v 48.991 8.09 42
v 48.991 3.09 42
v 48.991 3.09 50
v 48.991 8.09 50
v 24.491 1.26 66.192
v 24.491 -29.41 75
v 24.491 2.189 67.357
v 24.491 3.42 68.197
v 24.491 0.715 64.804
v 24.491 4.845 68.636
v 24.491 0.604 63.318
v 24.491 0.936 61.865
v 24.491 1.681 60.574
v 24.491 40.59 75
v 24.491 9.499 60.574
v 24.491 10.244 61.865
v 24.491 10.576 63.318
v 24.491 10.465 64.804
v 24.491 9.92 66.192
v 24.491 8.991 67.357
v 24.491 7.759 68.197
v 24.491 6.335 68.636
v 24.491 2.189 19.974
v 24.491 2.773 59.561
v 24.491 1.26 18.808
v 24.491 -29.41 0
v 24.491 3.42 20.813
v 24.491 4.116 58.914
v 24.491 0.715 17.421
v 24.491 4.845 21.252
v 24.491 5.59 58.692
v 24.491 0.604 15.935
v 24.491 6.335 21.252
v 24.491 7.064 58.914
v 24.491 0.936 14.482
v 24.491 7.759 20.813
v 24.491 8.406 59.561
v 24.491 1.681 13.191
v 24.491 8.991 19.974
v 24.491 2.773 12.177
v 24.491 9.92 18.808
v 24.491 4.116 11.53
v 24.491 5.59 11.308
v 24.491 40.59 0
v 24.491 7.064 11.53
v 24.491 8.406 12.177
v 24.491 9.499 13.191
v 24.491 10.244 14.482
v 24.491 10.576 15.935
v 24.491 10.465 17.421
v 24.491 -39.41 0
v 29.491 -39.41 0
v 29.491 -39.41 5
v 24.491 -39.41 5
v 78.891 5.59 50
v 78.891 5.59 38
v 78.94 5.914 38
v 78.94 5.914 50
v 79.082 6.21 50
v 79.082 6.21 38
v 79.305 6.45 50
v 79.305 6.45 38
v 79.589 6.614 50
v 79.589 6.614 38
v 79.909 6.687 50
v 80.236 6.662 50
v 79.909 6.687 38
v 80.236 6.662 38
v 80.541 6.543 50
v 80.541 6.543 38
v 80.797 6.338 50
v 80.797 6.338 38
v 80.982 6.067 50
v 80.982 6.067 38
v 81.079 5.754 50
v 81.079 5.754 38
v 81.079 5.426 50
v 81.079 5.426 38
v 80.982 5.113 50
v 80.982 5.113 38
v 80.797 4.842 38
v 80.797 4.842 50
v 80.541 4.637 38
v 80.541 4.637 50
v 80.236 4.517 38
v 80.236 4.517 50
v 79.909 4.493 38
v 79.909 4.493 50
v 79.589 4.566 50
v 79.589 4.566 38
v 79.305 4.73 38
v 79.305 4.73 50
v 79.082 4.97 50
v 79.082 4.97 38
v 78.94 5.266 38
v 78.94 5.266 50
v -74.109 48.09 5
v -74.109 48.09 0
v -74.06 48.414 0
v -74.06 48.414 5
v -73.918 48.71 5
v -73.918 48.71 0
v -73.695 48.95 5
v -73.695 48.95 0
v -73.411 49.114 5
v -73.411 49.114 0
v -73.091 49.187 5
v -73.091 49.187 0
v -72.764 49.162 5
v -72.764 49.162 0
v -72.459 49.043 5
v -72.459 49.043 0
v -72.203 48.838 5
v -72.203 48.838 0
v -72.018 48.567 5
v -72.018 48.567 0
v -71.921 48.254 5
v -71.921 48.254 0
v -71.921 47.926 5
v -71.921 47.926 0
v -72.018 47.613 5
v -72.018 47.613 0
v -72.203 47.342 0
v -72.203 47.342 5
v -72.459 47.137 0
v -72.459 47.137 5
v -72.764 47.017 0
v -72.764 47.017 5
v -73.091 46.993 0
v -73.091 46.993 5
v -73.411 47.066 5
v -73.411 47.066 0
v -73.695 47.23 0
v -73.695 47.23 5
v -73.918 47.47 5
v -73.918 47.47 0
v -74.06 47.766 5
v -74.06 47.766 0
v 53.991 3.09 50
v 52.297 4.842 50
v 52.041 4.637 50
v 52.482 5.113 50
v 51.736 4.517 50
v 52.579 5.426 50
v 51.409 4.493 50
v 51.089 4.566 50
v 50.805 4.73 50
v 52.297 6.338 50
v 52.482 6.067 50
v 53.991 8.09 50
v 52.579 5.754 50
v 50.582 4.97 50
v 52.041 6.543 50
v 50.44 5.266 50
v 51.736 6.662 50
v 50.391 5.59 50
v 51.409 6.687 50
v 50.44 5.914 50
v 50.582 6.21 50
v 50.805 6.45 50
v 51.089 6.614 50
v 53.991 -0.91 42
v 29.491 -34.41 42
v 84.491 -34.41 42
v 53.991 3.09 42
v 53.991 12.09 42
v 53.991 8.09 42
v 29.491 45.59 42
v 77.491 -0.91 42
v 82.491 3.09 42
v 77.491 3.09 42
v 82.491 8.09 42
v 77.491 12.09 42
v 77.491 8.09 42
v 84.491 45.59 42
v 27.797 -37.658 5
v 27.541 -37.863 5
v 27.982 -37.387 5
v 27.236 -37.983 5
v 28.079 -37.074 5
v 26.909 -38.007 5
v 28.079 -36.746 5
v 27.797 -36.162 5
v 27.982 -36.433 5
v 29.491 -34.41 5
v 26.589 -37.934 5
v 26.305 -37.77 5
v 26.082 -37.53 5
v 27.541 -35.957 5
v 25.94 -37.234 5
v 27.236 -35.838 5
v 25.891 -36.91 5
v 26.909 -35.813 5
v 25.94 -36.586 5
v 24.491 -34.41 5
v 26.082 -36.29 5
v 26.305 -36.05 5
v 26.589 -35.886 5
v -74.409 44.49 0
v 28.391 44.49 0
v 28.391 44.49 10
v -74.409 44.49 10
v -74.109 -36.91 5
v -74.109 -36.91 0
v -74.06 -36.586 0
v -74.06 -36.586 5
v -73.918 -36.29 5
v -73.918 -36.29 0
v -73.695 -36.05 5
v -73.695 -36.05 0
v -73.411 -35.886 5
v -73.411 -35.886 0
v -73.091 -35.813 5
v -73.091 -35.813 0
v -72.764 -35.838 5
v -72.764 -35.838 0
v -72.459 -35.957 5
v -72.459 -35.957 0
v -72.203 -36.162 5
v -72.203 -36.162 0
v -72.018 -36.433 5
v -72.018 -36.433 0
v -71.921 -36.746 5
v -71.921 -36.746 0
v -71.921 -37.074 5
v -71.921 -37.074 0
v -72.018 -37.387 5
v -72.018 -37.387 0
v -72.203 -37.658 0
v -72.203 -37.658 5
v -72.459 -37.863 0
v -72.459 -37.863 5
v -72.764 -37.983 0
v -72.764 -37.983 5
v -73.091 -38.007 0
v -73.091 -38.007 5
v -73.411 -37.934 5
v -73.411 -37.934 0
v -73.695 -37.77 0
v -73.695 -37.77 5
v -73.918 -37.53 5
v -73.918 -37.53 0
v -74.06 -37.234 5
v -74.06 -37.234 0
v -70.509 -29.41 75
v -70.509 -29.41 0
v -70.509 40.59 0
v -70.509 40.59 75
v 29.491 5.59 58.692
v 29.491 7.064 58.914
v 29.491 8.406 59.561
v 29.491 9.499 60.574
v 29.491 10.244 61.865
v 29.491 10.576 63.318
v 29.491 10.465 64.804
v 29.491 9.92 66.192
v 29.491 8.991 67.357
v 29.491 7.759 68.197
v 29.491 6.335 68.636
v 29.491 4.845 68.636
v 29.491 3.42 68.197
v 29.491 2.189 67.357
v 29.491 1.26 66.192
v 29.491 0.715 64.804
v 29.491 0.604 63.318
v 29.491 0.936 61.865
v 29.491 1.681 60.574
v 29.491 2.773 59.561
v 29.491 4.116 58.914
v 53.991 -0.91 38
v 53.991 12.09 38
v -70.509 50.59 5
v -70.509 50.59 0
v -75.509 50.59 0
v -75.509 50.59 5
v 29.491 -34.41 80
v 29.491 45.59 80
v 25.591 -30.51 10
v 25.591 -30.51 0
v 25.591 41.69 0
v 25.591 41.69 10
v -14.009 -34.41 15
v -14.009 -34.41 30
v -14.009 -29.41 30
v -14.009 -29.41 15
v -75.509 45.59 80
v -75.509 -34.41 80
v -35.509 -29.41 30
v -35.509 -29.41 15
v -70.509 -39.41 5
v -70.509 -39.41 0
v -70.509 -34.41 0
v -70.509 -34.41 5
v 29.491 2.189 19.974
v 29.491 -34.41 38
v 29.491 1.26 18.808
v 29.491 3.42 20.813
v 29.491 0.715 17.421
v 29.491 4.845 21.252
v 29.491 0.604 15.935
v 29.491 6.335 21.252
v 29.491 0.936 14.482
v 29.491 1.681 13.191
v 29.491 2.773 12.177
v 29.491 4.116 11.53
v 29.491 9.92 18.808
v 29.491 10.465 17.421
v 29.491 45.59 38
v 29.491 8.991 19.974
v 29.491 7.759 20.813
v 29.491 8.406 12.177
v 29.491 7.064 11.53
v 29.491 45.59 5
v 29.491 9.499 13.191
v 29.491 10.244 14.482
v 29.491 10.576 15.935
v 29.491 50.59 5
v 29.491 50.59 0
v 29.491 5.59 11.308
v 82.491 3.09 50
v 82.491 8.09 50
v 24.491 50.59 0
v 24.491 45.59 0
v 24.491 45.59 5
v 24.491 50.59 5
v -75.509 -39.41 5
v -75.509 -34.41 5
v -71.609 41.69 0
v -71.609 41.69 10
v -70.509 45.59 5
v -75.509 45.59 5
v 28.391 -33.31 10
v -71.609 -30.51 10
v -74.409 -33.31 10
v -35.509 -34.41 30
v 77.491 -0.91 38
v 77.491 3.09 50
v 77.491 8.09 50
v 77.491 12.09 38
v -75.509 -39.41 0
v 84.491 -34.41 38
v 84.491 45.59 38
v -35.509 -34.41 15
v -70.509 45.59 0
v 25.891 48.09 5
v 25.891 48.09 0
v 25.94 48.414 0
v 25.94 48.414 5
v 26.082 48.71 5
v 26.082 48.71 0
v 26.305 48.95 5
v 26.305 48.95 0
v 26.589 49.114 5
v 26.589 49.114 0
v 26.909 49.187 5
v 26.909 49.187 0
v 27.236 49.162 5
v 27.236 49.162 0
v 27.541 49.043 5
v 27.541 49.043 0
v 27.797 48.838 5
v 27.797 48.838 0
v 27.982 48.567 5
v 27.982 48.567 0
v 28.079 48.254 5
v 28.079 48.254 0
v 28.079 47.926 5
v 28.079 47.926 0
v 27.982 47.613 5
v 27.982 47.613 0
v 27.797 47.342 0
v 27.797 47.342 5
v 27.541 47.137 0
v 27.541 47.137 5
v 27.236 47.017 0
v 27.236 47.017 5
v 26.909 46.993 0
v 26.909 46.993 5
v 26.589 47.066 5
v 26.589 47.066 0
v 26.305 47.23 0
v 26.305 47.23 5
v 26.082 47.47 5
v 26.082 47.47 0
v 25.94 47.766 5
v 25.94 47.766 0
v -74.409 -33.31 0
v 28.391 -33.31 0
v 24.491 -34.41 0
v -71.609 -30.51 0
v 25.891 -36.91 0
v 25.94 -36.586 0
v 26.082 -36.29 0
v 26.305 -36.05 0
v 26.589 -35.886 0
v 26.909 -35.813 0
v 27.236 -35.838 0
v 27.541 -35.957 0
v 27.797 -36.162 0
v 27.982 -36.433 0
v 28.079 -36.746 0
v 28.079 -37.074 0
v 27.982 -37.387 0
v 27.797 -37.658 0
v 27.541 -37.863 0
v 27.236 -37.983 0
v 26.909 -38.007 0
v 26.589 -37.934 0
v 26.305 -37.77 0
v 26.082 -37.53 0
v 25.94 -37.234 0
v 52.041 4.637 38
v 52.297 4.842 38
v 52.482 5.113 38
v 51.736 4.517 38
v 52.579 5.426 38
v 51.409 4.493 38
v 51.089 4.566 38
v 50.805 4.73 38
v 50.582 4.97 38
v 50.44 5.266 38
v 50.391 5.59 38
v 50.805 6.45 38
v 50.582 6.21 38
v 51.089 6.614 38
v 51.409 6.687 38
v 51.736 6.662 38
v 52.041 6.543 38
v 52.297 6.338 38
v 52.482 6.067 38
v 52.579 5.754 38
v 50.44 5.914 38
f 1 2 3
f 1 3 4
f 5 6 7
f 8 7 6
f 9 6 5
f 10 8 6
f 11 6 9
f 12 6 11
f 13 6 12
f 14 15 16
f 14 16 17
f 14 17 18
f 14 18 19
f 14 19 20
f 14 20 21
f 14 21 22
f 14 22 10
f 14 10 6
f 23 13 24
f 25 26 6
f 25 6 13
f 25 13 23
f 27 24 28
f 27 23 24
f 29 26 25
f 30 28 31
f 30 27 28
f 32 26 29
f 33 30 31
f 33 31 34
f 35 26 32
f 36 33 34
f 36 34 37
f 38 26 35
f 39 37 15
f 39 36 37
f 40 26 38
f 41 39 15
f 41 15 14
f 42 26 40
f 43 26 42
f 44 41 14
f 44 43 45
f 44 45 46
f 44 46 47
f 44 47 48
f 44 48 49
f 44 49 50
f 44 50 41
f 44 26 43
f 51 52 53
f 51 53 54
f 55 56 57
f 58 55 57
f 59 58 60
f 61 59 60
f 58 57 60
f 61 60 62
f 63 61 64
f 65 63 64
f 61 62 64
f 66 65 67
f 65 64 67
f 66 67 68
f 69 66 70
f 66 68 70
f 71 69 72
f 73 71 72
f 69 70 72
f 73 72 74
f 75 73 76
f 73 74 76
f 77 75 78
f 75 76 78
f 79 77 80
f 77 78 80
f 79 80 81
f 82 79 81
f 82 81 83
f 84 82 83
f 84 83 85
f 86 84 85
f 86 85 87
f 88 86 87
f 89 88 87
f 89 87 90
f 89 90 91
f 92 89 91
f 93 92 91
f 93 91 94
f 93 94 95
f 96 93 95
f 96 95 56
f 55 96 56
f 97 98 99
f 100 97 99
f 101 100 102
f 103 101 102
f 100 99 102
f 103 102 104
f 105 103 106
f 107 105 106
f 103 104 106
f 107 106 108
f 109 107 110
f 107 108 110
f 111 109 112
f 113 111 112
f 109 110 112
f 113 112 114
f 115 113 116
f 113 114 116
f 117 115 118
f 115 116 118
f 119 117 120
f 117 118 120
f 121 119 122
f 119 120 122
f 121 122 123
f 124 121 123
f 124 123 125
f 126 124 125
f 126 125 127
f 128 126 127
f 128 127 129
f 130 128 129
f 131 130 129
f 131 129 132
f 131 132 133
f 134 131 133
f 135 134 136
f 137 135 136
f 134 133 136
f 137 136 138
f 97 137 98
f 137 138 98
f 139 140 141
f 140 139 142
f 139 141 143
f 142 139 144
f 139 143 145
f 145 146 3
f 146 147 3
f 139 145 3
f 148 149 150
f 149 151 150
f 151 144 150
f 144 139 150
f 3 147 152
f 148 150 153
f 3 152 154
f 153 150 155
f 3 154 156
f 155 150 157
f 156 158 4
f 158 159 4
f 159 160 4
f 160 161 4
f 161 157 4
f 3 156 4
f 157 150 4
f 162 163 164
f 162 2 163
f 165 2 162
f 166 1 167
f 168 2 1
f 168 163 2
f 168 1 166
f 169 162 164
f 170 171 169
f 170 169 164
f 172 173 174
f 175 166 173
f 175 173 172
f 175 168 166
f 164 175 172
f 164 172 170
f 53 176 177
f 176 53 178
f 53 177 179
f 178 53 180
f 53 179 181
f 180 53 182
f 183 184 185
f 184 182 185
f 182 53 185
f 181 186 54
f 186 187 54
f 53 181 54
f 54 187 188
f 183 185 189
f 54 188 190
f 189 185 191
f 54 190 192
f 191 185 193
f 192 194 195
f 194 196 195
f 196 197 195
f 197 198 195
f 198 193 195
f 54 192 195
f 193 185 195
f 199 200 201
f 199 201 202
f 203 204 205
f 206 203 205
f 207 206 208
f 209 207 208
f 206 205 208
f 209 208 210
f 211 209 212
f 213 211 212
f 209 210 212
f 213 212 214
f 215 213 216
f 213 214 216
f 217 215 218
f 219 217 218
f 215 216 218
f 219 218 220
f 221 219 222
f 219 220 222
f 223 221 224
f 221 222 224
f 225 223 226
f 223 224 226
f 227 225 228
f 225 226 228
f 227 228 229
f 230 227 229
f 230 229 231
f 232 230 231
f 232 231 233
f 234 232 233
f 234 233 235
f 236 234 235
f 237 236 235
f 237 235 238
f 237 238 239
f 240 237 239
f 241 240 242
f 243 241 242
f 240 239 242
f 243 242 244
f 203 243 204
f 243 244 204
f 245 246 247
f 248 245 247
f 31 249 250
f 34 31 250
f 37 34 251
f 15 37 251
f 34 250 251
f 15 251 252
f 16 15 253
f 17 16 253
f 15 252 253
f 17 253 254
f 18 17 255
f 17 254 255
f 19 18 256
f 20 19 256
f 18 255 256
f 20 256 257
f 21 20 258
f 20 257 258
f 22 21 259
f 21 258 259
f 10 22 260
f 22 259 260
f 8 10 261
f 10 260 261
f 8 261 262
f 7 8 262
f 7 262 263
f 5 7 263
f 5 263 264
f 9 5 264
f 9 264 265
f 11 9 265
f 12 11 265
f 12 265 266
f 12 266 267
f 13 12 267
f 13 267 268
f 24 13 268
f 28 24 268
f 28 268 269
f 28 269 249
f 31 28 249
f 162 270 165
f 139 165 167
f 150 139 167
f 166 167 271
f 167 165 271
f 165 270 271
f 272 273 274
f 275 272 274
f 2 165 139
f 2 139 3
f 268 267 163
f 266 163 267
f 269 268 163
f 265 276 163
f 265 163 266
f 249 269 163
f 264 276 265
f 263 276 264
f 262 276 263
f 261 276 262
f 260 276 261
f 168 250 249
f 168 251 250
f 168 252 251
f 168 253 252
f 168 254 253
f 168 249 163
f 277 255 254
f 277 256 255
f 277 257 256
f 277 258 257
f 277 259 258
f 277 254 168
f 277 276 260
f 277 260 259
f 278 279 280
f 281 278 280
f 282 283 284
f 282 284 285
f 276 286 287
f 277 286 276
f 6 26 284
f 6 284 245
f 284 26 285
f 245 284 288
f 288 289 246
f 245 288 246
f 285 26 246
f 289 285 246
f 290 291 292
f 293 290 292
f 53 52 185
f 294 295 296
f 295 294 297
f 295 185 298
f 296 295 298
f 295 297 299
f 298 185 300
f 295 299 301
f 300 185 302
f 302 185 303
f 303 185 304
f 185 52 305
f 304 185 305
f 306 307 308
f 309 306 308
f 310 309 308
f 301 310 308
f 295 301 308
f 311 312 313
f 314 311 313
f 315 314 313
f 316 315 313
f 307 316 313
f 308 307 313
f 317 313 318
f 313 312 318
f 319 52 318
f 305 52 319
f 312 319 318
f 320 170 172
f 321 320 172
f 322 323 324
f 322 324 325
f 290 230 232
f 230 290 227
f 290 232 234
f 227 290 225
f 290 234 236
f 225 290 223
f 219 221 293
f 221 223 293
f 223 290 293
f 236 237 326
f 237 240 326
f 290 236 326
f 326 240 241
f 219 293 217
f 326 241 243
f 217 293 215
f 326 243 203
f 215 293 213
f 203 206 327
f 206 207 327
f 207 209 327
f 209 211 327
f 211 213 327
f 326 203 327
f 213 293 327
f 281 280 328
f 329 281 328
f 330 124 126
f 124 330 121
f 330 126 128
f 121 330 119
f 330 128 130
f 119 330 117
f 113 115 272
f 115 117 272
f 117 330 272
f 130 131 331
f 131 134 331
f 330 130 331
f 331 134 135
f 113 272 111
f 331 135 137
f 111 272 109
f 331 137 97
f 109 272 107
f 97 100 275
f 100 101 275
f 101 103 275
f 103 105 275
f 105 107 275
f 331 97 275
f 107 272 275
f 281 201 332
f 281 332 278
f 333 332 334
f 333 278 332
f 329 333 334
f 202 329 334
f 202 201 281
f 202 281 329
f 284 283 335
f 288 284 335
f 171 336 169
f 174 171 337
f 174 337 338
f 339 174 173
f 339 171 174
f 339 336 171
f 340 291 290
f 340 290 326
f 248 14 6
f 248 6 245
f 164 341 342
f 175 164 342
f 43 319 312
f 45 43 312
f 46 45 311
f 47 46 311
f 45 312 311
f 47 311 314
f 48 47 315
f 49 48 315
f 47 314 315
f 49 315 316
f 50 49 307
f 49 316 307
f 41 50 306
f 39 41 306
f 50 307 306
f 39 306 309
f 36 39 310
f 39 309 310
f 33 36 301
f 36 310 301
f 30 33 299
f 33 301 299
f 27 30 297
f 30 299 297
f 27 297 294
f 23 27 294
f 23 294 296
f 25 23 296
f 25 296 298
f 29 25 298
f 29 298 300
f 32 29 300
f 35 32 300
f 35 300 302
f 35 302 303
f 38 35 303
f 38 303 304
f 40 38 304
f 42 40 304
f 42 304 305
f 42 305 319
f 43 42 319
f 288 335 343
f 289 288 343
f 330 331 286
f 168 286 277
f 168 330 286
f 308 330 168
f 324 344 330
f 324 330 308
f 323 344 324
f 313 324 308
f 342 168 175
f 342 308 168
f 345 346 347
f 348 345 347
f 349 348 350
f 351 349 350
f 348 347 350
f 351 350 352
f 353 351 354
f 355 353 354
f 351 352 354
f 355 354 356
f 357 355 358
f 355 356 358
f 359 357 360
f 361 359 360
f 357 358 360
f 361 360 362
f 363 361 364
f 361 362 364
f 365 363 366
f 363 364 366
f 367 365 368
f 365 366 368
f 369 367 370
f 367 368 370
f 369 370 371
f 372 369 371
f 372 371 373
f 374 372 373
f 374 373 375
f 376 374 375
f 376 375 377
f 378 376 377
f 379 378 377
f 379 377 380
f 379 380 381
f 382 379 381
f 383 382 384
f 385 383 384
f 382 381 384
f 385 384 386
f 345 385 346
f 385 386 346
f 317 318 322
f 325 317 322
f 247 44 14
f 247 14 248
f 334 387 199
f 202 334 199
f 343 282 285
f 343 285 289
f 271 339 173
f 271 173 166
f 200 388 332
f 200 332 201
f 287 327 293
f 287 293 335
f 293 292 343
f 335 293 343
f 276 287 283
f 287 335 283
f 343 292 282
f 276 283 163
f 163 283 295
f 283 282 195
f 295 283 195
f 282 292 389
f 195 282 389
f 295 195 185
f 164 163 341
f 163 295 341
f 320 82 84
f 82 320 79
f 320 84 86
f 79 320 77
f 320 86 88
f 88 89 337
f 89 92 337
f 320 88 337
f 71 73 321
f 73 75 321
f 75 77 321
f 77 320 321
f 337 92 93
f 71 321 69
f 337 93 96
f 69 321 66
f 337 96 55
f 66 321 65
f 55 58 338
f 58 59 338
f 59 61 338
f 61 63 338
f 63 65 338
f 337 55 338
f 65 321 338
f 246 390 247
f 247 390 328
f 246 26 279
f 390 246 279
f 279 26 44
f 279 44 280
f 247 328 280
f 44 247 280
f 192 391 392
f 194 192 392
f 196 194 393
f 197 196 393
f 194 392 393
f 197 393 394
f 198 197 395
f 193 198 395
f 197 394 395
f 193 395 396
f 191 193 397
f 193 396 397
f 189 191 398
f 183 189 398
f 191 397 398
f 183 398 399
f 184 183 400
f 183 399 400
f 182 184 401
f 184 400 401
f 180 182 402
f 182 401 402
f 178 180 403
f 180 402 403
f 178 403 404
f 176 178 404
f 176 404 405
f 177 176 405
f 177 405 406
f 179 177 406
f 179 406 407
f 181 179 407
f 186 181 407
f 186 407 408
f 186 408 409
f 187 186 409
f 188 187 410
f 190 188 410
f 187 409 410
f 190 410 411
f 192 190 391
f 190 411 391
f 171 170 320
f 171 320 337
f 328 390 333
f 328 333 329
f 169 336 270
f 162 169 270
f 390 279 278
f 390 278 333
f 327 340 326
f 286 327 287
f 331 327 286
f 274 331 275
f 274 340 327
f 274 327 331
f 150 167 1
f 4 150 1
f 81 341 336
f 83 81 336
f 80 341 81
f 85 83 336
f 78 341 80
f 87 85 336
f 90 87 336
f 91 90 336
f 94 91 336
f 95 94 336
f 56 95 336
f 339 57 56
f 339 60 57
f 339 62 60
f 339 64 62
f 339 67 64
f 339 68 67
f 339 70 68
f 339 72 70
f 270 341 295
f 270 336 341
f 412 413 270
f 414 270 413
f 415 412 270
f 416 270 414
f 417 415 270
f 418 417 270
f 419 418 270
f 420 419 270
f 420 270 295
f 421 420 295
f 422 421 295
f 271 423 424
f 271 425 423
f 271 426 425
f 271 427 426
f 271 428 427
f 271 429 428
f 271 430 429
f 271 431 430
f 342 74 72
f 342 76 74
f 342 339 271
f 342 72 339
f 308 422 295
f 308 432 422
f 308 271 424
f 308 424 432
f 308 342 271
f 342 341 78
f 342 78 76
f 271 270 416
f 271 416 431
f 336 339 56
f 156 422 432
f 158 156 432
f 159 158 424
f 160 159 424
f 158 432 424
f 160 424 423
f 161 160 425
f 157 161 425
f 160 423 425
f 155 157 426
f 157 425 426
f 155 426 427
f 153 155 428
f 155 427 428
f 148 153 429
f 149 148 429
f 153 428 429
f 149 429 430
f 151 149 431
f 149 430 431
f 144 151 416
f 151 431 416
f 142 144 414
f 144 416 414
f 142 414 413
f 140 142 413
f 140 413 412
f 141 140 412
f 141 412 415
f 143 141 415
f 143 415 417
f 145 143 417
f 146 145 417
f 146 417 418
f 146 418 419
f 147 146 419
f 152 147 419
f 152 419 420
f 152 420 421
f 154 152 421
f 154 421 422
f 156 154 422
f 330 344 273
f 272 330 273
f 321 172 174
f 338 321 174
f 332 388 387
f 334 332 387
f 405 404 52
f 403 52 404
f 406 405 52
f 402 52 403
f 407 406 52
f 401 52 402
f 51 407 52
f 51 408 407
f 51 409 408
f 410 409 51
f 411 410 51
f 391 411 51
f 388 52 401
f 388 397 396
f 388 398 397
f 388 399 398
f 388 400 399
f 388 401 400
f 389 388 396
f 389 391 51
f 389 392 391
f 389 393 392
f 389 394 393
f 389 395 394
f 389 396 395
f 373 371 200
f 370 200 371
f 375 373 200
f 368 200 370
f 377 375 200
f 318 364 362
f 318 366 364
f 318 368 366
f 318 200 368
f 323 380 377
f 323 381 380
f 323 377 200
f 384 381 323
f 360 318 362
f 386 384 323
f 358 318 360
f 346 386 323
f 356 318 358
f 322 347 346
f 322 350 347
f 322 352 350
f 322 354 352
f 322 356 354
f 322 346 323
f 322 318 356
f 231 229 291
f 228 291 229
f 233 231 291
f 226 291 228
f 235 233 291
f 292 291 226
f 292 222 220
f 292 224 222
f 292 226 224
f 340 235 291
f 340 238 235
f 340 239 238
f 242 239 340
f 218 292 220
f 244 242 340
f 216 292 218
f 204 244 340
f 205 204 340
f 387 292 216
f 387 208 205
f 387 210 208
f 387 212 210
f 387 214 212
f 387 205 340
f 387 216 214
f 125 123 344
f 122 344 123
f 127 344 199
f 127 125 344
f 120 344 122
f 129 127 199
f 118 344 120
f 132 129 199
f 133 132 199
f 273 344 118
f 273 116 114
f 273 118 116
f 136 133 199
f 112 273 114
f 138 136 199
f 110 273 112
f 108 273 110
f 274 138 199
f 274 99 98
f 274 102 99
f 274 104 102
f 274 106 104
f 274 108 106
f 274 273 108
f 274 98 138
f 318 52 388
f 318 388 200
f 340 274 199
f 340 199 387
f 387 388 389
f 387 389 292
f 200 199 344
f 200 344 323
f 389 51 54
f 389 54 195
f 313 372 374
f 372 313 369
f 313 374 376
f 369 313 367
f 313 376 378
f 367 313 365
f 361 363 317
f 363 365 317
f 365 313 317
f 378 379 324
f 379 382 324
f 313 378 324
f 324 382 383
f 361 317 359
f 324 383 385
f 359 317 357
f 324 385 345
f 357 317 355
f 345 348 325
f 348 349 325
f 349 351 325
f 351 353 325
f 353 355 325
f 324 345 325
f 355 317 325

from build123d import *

# Parameters (mm, degrees)
SKETCH_1_W                = 160
SKETCH_1_H                = 80
EXTRUDE_1_DEPTH           = 80
SKETCH_10_W               = 21.5
SKETCH_10_H               = 15
CUT_EXTRUDE_6_DEPTH       = 10
SKETCH_11_W               = 55
SKETCH_11_H               = 80
CUT_EXTRUDE_7_DEPTH       = 38
SKETCH_12_W               = 55
SKETCH_12_H               = 80
CUT_EXTRUDE_8_DEPTH       = 38
SKETCH_14_W               = 95
SKETCH_14_H               = 70
CUT_EXTRUDE_9_DEPTH       = 75
SKETCH_15_W               = 102.8
SKETCH_15_H               = 77.8
SKETCH_15_W_2             = 97.2
SKETCH_15_H_2             = 72.2
CUT_EXTRUDE_10_DEPTH      = 10
SKETCH_16_W               = 5
SKETCH_16_H               = 5
SKETCH_16_R               = 1.1
EXTRUDE_2_DEPTH           = 5
SKETCH_17_R               = 5
CUT_EXTRUDE_12_DEPTH      = 9.2
SKETCH_18_W               = 23.5
SKETCH_18_H               = 13
CUT_EXTRUDE_13_DEPTH      = 9.2
SKETCH_19_W               = 5
SKETCH_19_H               = 5
SKETCH_19_R               = 1.1
EXTRUDE_3_DEPTH           = 12
SKETCH_20_R               = 1.1
CUT_EXTRUDE_14_DEPTH      = 5
CUT_EXTRUDE_14_DEPTH_BACK = 5


with BuildPart() as part:
    # 草圖1 → 填料-伸長1 (new body)
    with BuildSketch(Plane.XY):
        with Locations((4.491097826, 5.58988764)):
            Rectangle(SKETCH_1_W, SKETCH_1_H)
    extrude(amount=EXTRUDE_1_DEPTH)

    # 草圖10 → 除料-伸長6 (cut)
    with BuildSketch(Plane(origin=(0, -34.41011236, 0), x_dir=(-1, 0, 0), z_dir=(0, -1, 0))):
        with Locations((24.758902174, -22.5)):
            Rectangle(SKETCH_10_W, SKETCH_10_H)
    extrude(amount=-CUT_EXTRUDE_6_DEPTH, mode=Mode.SUBTRACT)

    # 草圖11 → 除料-伸長7 (cut)
    with BuildSketch(Plane(origin=(0, 0, 0), x_dir=(-1, 0, 0), z_dir=(0, 0, -1))):
        with Locations((-56.991097826, 5.58988764)):
            Rectangle(SKETCH_11_W, SKETCH_11_H)
    extrude(amount=-CUT_EXTRUDE_7_DEPTH, mode=Mode.SUBTRACT)

    # 草圖12 → 除料-伸長8 (cut)
    with BuildSketch(Plane.XY.offset(80)):
        with Locations((56.991097826, 5.58988764)):
            Rectangle(SKETCH_12_W, SKETCH_12_H)
    extrude(amount=-CUT_EXTRUDE_8_DEPTH, mode=Mode.SUBTRACT)

    # 草圖14 → 除料-伸長9 (cut)
    with BuildSketch(Plane(origin=(0, 0, 0), x_dir=(-1, 0, 0), z_dir=(0, 0, -1))):
        with Locations((23.008902174, 5.58988764)):
            Rectangle(SKETCH_14_W, SKETCH_14_H)
    extrude(amount=-CUT_EXTRUDE_9_DEPTH, mode=Mode.SUBTRACT)

    # 草圖15 → 除料-伸長10 (cut)
    with BuildSketch(Plane(origin=(0, 0, 0), x_dir=(-1, 0, 0), z_dir=(0, 0, -1))):
        with Locations((23.008902174, 5.58988764)):
            Rectangle(SKETCH_15_W, SKETCH_15_H)
        with Locations((23.008902174, 5.58988764)):
            Rectangle(SKETCH_15_W_2, SKETCH_15_H_2, mode=Mode.SUBTRACT)
    extrude(amount=-CUT_EXTRUDE_10_DEPTH, mode=Mode.SUBTRACT)

    # 草圖16 → 填料-伸長2 (add)
    with BuildSketch(Plane(origin=(0, 0, 0), x_dir=(-1, 0, 0), z_dir=(0, 0, -1))):
        with Locations((-26.991097826, 48.08988764)):
            Rectangle(SKETCH_16_W, SKETCH_16_H)
        with Locations((-26.991097826, 48.08988764)):
            Circle(SKETCH_16_R, mode=Mode.SUBTRACT)
        with Locations((73.008902174, 48.08988764)):
            Rectangle(SKETCH_16_W, SKETCH_16_H)
        with Locations((73.008902174, 48.08988764)):
            Circle(SKETCH_16_R, mode=Mode.SUBTRACT)
        with Locations((73.008902174, -36.91011236)):
            Rectangle(SKETCH_16_W, SKETCH_16_H)
        with Locations((73.008902174, -36.91011236)):
            Circle(SKETCH_16_R, mode=Mode.SUBTRACT)
        with Locations((-26.991097826, -36.91011236)):
            Rectangle(SKETCH_16_W, SKETCH_16_H)
        with Locations((-26.991097826, -36.91011236)):
            Circle(SKETCH_16_R, mode=Mode.SUBTRACT)
    extrude(amount=-EXTRUDE_2_DEPTH)

    # 草圖17 → 除料-伸長12 (cut)
    with BuildSketch(Plane(origin=(29.491097826, 0, 0), x_dir=(0, 0, -1), z_dir=(1, 0, 0))):
        with Locations((-63.691723703, 5.58988764)):
            Circle(SKETCH_17_R)
        with Locations((-16.308276297, 5.58988764)):
            Circle(SKETCH_17_R)
    extrude(amount=-CUT_EXTRUDE_12_DEPTH, mode=Mode.SUBTRACT)

    # 草圖18 → 除料-伸長13 (cut)
    with BuildSketch(Plane(origin=(0, 0, 38), x_dir=(-1, 0, 0), z_dir=(0, 0, -1))):
        with Locations((-65.741097826, 5.58988764)):
            Rectangle(SKETCH_18_W, SKETCH_18_H)
    extrude(amount=-CUT_EXTRUDE_13_DEPTH, mode=Mode.SUBTRACT)

    # 草圖19 → 填料-伸長3 (add)
    with BuildSketch(Plane(origin=(0, 0, 38), x_dir=(-1, 0, 0), z_dir=(0, 0, -1))):
        with Locations((-79.991097826, 5.58988764)):
            Rectangle(SKETCH_19_W, SKETCH_19_H)
        with Locations((-79.991097826, 5.58988764)):
            Circle(SKETCH_19_R, mode=Mode.SUBTRACT)
        with Locations((-51.491097826, 5.58988764)):
            Rectangle(SKETCH_19_W, SKETCH_19_H)
        with Locations((-51.491097826, 5.58988764)):
            Circle(SKETCH_19_R, mode=Mode.SUBTRACT)
    extrude(amount=-EXTRUDE_3_DEPTH)

    # 草圖20 → 除料-伸長14 (cut, two sides)
    with BuildSketch(Plane(origin=(0, 0, 38), x_dir=(-1, 0, 0), z_dir=(0, 0, -1))) as cut_extrude_14_sk:
        with Locations((-79.991097826, 5.58988764)):
            Circle(SKETCH_20_R)
        with Locations((-51.491097826, 5.58988764)):
            Circle(SKETCH_20_R)
    extrude(amount=CUT_EXTRUDE_14_DEPTH, mode=Mode.SUBTRACT)
    extrude(cut_extrude_14_sk.sketch, amount=-CUT_EXTRUDE_14_DEPTH_BACK, mode=Mode.SUBTRACT)


solid = part.part
